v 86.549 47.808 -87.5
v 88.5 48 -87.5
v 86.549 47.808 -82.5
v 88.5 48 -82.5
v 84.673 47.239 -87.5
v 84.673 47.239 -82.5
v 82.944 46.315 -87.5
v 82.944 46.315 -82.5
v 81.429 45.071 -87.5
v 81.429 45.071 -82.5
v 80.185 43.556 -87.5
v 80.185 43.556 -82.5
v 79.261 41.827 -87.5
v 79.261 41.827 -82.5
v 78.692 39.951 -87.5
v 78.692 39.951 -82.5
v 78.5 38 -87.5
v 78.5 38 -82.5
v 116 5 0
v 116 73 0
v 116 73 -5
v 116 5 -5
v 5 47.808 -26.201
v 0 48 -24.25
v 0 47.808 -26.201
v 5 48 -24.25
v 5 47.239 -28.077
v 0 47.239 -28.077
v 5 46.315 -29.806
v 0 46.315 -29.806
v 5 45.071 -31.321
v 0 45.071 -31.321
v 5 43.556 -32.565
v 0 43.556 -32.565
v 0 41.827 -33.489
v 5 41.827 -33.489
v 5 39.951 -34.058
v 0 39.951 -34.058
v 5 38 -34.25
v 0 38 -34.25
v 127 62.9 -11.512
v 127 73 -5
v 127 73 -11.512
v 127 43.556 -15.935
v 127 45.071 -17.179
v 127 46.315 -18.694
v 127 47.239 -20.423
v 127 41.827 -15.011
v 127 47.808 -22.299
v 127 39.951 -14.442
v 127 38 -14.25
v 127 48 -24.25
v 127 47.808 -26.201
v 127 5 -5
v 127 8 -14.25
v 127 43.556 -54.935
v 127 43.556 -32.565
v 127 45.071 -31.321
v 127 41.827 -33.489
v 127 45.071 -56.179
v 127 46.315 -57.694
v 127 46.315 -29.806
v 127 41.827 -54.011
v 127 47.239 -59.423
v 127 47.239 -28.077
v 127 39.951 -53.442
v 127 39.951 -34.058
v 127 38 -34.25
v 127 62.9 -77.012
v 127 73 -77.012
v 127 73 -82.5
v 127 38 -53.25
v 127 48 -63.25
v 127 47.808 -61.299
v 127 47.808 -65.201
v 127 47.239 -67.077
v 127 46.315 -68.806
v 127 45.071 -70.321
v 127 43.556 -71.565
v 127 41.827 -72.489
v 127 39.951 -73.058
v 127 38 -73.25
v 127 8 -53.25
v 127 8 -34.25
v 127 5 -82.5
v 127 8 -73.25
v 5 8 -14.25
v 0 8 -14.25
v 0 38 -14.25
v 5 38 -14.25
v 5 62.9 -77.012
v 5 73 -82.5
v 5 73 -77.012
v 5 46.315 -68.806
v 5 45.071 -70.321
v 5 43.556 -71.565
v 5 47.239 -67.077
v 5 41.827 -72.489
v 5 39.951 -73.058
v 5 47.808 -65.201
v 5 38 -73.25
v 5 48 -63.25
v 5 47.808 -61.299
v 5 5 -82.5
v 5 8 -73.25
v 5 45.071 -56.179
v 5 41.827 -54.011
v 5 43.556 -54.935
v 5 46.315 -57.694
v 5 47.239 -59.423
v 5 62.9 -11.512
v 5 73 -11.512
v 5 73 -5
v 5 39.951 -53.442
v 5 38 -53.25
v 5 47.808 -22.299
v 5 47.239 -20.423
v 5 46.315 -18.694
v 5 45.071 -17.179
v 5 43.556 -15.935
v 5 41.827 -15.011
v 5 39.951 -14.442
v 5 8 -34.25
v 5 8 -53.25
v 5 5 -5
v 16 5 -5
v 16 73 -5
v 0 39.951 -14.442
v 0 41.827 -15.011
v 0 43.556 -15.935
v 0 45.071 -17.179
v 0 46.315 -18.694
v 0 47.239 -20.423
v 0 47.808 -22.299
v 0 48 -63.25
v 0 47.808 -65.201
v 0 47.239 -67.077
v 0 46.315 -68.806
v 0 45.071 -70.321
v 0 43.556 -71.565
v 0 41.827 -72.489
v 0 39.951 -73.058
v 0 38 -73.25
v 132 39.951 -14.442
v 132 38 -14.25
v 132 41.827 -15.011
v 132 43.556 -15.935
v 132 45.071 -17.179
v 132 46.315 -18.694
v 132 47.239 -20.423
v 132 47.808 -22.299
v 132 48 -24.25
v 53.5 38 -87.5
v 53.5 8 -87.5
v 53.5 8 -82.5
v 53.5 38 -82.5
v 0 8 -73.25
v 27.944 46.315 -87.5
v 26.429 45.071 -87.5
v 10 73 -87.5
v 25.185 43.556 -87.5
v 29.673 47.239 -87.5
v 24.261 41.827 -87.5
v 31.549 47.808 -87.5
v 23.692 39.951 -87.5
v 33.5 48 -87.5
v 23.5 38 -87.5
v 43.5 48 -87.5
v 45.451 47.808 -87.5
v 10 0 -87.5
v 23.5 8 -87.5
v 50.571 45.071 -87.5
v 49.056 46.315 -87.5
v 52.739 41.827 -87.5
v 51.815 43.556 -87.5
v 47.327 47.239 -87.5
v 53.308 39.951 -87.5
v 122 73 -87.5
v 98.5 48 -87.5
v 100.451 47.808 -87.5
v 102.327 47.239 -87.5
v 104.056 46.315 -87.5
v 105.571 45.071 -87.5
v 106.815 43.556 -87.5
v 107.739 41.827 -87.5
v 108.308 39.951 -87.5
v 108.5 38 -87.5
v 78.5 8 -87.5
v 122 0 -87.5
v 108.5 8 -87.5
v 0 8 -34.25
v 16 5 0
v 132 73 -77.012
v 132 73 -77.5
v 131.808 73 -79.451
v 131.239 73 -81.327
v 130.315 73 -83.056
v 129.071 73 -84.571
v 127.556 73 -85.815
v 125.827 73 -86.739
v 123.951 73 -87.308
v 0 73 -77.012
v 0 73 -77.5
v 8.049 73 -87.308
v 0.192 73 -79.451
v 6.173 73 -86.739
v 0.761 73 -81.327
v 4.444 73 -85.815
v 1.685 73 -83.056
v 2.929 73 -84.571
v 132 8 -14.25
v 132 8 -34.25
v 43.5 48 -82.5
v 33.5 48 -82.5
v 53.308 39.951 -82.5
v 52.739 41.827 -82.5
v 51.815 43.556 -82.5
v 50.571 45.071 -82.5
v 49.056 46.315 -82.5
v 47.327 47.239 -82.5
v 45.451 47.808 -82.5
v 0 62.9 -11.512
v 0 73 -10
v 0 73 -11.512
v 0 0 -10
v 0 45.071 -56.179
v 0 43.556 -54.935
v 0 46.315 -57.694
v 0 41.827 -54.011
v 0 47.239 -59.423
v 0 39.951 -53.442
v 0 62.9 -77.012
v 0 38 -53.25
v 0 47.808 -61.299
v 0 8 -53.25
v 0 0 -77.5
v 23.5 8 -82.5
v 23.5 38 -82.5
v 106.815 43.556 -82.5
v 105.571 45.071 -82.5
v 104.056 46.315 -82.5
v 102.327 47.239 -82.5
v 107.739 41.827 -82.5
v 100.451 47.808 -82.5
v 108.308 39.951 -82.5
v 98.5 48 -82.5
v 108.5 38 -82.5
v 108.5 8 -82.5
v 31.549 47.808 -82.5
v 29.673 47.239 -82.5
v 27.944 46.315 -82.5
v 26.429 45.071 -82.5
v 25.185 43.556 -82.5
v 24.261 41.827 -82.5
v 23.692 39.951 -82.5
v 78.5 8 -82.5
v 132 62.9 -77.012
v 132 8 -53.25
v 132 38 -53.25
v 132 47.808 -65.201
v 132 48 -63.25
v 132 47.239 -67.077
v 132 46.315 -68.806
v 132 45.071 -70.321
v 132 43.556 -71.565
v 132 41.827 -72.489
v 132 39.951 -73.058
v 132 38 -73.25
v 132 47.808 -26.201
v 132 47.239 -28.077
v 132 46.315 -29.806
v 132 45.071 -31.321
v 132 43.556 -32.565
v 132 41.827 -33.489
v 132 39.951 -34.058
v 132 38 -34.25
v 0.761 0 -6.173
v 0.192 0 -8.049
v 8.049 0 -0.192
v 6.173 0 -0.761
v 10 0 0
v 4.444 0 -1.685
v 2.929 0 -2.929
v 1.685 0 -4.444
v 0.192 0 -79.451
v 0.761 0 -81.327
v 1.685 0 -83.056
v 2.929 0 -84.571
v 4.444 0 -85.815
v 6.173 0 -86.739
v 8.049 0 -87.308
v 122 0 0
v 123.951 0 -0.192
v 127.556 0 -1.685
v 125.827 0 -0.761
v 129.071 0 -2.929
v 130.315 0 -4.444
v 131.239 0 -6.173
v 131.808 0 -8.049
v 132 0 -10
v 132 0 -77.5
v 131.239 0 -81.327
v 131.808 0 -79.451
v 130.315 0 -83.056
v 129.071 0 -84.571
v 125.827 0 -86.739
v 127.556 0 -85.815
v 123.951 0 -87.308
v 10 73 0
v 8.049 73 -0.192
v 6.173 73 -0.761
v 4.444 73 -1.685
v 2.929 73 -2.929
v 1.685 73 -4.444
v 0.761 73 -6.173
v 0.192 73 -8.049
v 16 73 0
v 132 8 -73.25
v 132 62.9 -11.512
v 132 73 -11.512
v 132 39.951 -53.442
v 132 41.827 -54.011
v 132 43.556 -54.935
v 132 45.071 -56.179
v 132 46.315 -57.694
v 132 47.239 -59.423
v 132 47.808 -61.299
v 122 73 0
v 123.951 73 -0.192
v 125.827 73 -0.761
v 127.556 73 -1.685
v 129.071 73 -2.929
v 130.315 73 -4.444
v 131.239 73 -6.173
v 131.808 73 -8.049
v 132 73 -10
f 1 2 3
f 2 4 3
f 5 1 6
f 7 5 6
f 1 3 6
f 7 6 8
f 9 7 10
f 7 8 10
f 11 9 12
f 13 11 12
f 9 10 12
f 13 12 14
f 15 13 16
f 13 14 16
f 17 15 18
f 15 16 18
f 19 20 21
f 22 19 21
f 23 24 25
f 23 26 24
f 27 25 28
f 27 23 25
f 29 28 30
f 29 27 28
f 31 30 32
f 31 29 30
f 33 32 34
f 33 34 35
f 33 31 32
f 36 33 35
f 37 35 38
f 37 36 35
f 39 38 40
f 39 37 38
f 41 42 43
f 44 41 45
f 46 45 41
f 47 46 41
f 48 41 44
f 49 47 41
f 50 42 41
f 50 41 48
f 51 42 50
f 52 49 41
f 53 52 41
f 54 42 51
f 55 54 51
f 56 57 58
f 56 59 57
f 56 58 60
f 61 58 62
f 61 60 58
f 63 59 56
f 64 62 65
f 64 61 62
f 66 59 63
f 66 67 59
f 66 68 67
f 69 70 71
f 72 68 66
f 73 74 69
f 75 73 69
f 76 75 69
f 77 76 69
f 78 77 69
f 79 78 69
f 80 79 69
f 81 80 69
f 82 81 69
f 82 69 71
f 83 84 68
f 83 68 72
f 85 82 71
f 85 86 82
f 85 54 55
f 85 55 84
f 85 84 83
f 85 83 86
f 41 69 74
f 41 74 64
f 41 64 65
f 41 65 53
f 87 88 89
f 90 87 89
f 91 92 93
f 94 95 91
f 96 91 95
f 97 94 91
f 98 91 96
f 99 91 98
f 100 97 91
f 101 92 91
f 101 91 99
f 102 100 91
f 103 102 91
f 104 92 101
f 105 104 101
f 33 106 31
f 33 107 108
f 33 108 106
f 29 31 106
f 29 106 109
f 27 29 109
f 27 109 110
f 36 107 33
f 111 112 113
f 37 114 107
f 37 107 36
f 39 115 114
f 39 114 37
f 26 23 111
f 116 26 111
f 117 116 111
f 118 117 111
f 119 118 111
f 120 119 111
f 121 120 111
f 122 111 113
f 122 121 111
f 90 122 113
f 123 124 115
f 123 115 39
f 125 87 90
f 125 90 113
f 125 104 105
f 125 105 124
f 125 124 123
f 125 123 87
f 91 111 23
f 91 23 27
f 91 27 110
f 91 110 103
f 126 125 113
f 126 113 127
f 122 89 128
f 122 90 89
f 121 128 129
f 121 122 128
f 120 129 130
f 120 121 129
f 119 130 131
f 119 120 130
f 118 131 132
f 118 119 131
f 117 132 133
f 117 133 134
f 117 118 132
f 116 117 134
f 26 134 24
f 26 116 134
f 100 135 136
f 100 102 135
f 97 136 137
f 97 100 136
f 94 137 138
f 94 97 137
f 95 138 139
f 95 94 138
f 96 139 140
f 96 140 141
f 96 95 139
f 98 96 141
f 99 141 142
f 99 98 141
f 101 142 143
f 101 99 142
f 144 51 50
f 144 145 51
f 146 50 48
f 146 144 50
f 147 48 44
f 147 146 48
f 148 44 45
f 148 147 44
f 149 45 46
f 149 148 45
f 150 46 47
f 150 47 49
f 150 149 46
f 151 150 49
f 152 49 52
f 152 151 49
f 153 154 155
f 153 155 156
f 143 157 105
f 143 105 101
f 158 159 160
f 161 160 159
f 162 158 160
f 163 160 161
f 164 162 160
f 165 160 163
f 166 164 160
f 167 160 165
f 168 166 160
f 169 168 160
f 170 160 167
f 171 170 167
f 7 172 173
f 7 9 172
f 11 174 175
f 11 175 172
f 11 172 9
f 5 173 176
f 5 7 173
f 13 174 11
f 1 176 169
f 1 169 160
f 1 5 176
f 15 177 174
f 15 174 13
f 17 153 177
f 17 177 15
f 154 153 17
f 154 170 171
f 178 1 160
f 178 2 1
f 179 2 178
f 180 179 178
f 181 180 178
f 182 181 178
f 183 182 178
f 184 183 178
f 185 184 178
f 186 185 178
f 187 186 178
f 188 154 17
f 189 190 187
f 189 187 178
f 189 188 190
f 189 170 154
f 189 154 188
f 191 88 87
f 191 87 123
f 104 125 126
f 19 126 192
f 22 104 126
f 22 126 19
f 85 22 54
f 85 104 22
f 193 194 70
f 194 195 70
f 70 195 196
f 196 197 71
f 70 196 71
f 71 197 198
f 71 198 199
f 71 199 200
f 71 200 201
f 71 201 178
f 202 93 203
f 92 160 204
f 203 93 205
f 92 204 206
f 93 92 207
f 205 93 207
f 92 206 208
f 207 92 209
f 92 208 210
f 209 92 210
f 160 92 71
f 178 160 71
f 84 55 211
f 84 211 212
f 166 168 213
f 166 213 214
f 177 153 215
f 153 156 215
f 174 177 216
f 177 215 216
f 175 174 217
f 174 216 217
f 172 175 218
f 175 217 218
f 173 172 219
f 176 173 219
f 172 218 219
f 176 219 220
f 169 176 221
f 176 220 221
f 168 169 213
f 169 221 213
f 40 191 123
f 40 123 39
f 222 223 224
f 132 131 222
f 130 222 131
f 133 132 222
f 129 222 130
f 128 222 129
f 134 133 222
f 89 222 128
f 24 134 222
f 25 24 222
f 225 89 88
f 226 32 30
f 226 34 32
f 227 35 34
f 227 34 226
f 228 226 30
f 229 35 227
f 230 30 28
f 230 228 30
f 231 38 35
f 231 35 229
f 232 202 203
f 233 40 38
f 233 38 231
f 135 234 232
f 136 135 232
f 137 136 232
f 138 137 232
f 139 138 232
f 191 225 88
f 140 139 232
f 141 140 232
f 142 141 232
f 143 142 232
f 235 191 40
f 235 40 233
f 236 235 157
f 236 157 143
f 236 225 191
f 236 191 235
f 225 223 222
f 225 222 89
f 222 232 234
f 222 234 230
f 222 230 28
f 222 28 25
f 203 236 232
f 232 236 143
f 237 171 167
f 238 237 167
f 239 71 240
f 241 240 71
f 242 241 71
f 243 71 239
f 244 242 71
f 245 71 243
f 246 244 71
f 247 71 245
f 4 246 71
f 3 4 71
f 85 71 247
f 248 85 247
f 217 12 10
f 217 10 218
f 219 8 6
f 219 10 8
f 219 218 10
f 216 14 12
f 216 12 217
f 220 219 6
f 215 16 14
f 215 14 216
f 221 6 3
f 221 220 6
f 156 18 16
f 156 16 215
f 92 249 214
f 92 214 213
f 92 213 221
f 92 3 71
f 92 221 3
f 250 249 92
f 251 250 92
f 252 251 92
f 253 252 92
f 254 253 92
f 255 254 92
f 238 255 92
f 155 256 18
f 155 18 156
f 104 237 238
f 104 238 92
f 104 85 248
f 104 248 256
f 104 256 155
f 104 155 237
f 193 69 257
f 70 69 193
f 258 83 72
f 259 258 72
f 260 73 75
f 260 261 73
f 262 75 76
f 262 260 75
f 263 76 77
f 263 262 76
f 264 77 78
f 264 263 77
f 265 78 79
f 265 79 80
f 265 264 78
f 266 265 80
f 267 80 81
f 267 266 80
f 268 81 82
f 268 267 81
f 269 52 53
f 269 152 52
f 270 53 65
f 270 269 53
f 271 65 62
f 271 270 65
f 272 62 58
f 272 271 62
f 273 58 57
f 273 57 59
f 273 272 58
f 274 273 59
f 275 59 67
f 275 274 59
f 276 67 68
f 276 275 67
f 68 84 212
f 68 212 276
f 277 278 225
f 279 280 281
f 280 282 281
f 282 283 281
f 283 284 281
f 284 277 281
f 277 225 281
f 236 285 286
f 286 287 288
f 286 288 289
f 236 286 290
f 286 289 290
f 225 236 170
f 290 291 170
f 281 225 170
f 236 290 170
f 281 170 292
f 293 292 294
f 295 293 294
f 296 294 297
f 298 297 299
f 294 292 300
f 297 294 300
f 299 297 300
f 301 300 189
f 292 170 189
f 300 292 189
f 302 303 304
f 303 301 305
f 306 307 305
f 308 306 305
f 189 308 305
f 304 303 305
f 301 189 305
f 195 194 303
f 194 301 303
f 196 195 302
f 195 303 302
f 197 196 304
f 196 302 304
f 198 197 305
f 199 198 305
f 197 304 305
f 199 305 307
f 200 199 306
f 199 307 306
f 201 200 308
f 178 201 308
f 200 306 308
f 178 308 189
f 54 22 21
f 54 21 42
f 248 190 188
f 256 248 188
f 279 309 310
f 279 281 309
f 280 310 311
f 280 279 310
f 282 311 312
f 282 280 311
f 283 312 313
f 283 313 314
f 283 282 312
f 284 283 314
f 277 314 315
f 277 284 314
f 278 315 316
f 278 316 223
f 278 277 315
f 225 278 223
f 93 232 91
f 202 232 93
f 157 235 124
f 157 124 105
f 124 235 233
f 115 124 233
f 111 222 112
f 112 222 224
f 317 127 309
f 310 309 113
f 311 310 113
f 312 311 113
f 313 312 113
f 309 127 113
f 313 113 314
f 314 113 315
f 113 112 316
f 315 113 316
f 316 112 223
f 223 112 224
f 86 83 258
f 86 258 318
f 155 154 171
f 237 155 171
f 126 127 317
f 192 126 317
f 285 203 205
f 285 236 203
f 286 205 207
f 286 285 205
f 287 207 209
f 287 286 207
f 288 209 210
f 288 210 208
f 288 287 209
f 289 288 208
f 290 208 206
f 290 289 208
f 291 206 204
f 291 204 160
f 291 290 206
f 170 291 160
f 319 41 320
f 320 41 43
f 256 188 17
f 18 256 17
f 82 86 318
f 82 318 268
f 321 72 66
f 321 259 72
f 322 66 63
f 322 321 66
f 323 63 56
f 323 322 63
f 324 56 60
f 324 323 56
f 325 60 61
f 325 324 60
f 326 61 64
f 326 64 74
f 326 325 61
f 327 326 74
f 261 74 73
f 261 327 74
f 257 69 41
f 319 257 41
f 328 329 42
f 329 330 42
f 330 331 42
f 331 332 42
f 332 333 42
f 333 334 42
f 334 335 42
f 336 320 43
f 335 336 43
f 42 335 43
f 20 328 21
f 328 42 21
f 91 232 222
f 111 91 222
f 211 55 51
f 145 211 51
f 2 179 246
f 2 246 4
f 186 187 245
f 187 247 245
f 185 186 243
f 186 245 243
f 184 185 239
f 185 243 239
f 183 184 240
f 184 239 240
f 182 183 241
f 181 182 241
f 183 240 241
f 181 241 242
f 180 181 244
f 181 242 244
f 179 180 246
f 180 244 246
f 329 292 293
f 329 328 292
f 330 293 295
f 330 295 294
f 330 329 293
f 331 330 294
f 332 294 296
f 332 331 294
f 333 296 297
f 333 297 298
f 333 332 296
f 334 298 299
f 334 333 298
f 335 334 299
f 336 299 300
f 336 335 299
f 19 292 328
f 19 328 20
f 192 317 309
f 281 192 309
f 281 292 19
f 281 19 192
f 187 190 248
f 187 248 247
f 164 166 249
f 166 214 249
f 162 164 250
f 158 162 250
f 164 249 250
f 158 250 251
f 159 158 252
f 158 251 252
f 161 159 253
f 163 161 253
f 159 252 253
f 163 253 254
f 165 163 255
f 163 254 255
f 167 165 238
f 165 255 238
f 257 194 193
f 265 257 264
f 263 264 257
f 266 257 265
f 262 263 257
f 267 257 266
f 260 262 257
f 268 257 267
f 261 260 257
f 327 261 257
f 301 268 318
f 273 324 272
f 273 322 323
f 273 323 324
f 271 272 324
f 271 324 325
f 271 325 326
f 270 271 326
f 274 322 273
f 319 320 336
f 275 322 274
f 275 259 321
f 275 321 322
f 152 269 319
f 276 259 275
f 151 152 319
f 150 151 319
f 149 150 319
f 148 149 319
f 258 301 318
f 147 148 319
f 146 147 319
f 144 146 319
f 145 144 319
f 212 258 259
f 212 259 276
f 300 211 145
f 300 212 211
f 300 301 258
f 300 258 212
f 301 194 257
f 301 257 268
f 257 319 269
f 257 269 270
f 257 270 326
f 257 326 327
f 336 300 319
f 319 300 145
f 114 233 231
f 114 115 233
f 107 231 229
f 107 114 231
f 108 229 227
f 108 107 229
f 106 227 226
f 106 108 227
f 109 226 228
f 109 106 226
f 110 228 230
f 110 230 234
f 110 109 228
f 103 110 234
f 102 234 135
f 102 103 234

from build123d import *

# Parameters (mm, degrees)
SKETCH1_W               = 132
SKETCH1_H               = 87.5
BOSS_EXTRUDE1_DEPTH     = 5
BOSS_EXTRUDE2_DEPTH     = 68
CUT_EXTRUDE1_DEPTH      = 175.382481918
CUT_EXTRUDE1_DEPTH_BACK = 175.382481918
SKETCH3_W               = 20
SKETCH3_H               = 40
CUT_EXTRUDE2_REACH      = 176.382
SKETCH4_W               = 30
SKETCH4_H               = 40
SKETCH5_W               = 65.5
SKETCH5_H               = 10.1
CUT_EXTRUDE3_DEPTH      = 175.382481918
FILLET1_R               = 10


with BuildPart() as part:
    # Sketch1 → Boss-Extrude1 (new body)
    with BuildSketch(Plane(origin=(0, 0, 0), x_dir=(1, 0, 0), z_dir=(0, 1, 0))):
        with Locations((66, 43.75)):
            Rectangle(SKETCH1_W, SKETCH1_H)
    extrude(amount=BOSS_EXTRUDE1_DEPTH)

    # Sketch2 → Boss-Extrude2 (add)
    with BuildSketch(Plane(origin=(0, 5, 0), x_dir=(1, 0, 0), z_dir=(0, 1, 0))):
        Polygon((5, 5), (16, 5), (16, 0), (0, 0), (0, 87.5), (132, 87.5), (132, 0), (116, 0), (116, 5), (127, 5), (127, 82.5), (5, 82.5), align=None)
    extrude(amount=BOSS_EXTRUDE2_DEPTH)

    # Sketch3 → Cut-Extrude1 (cut, two sides: drawn at the far end of the back side and taken through both)
    with BuildSketch(Plane(origin=(132, 0, 0), x_dir=(0, 0, -1), z_dir=(1, 0, 0)).offset(-CUT_EXTRUDE1_DEPTH_BACK)):
        with Locations((24.25, 28)):
            Rectangle(SKETCH3_W, SKETCH3_H)
        with Locations((63.25, 28)):
            Rectangle(SKETCH3_W, SKETCH3_H)
    extrude(amount=CUT_EXTRUDE1_DEPTH + CUT_EXTRUDE1_DEPTH_BACK, mode=Mode.SUBTRACT)

    # Sketch4 → Cut-Extrude2 (cut, up to next)
    with BuildSketch(Plane(origin=(0, 0, -87.5), x_dir=(-1, 0, 0), z_dir=(0, 0, -1)), mode=Mode.PRIVATE) as cut_extrude2_sk1:
        with Locations((-93.5, 28)):
            Rectangle(SKETCH4_W, SKETCH4_H)
    cut_extrude2_tool1 = extrude(cut_extrude2_sk1.sketch, amount=-CUT_EXTRUDE2_REACH, mode=Mode.PRIVATE) & part.part
    # Sketch4 → Cut-Extrude2 (cut, up to next)
    with BuildSketch(Plane(origin=(0, 0, -87.5), x_dir=(-1, 0, 0), z_dir=(0, 0, -1)), mode=Mode.PRIVATE) as cut_extrude2_sk2:
        with Locations((-38.5, 28)):
            Rectangle(SKETCH4_W, SKETCH4_H)
    cut_extrude2_tool2 = extrude(cut_extrude2_sk2.sketch, amount=-CUT_EXTRUDE2_REACH, mode=Mode.PRIVATE) & part.part
    add(cut_extrude2_tool1.solids().sort_by_distance((93.5, 28, -87.5))[0], mode=Mode.SUBTRACT)
    add(cut_extrude2_tool2.solids().sort_by_distance((38.5, 28, -87.5))[0], mode=Mode.SUBTRACT)

    # Sketch5 → Cut-Extrude3 (cut, through all)
    with BuildSketch(Plane.ZY):
        with Locations((-44.2623336, 67.95)):
            Rectangle(SKETCH5_W, SKETCH5_H)
    extrude(amount=-CUT_EXTRUDE3_DEPTH, mode=Mode.SUBTRACT)

    # Fillet1
    fillet1_edges = [part.edges().sort_by_distance(p)[0] for p in [
        (108.5, 48, -85),
        (78.5, 48, -85),
        (53.5, 48, -85),
        (23.5, 48, -85),
        (2.5, 48, -73.25),
        (2.5, 48, -53.25),
        (2.5, 48, -14.25),
        (2.5, 48, -34.25),
        (129.5, 48, -14.25),
        (129.5, 48, -34.25),
        (129.5, 48, -73.25),
        (129.5, 48, -53.25),
        (132, 36.5, -87.5),
        (132, 36.5, 0),
        (0, 36.5, 0),
        (0, 36.5, -87.5),
    ]]
    fillet(fillet1_edges, radius=FILLET1_R - 0.0001)  # a hair under: the kernel refuses the full size


solid = part.part
